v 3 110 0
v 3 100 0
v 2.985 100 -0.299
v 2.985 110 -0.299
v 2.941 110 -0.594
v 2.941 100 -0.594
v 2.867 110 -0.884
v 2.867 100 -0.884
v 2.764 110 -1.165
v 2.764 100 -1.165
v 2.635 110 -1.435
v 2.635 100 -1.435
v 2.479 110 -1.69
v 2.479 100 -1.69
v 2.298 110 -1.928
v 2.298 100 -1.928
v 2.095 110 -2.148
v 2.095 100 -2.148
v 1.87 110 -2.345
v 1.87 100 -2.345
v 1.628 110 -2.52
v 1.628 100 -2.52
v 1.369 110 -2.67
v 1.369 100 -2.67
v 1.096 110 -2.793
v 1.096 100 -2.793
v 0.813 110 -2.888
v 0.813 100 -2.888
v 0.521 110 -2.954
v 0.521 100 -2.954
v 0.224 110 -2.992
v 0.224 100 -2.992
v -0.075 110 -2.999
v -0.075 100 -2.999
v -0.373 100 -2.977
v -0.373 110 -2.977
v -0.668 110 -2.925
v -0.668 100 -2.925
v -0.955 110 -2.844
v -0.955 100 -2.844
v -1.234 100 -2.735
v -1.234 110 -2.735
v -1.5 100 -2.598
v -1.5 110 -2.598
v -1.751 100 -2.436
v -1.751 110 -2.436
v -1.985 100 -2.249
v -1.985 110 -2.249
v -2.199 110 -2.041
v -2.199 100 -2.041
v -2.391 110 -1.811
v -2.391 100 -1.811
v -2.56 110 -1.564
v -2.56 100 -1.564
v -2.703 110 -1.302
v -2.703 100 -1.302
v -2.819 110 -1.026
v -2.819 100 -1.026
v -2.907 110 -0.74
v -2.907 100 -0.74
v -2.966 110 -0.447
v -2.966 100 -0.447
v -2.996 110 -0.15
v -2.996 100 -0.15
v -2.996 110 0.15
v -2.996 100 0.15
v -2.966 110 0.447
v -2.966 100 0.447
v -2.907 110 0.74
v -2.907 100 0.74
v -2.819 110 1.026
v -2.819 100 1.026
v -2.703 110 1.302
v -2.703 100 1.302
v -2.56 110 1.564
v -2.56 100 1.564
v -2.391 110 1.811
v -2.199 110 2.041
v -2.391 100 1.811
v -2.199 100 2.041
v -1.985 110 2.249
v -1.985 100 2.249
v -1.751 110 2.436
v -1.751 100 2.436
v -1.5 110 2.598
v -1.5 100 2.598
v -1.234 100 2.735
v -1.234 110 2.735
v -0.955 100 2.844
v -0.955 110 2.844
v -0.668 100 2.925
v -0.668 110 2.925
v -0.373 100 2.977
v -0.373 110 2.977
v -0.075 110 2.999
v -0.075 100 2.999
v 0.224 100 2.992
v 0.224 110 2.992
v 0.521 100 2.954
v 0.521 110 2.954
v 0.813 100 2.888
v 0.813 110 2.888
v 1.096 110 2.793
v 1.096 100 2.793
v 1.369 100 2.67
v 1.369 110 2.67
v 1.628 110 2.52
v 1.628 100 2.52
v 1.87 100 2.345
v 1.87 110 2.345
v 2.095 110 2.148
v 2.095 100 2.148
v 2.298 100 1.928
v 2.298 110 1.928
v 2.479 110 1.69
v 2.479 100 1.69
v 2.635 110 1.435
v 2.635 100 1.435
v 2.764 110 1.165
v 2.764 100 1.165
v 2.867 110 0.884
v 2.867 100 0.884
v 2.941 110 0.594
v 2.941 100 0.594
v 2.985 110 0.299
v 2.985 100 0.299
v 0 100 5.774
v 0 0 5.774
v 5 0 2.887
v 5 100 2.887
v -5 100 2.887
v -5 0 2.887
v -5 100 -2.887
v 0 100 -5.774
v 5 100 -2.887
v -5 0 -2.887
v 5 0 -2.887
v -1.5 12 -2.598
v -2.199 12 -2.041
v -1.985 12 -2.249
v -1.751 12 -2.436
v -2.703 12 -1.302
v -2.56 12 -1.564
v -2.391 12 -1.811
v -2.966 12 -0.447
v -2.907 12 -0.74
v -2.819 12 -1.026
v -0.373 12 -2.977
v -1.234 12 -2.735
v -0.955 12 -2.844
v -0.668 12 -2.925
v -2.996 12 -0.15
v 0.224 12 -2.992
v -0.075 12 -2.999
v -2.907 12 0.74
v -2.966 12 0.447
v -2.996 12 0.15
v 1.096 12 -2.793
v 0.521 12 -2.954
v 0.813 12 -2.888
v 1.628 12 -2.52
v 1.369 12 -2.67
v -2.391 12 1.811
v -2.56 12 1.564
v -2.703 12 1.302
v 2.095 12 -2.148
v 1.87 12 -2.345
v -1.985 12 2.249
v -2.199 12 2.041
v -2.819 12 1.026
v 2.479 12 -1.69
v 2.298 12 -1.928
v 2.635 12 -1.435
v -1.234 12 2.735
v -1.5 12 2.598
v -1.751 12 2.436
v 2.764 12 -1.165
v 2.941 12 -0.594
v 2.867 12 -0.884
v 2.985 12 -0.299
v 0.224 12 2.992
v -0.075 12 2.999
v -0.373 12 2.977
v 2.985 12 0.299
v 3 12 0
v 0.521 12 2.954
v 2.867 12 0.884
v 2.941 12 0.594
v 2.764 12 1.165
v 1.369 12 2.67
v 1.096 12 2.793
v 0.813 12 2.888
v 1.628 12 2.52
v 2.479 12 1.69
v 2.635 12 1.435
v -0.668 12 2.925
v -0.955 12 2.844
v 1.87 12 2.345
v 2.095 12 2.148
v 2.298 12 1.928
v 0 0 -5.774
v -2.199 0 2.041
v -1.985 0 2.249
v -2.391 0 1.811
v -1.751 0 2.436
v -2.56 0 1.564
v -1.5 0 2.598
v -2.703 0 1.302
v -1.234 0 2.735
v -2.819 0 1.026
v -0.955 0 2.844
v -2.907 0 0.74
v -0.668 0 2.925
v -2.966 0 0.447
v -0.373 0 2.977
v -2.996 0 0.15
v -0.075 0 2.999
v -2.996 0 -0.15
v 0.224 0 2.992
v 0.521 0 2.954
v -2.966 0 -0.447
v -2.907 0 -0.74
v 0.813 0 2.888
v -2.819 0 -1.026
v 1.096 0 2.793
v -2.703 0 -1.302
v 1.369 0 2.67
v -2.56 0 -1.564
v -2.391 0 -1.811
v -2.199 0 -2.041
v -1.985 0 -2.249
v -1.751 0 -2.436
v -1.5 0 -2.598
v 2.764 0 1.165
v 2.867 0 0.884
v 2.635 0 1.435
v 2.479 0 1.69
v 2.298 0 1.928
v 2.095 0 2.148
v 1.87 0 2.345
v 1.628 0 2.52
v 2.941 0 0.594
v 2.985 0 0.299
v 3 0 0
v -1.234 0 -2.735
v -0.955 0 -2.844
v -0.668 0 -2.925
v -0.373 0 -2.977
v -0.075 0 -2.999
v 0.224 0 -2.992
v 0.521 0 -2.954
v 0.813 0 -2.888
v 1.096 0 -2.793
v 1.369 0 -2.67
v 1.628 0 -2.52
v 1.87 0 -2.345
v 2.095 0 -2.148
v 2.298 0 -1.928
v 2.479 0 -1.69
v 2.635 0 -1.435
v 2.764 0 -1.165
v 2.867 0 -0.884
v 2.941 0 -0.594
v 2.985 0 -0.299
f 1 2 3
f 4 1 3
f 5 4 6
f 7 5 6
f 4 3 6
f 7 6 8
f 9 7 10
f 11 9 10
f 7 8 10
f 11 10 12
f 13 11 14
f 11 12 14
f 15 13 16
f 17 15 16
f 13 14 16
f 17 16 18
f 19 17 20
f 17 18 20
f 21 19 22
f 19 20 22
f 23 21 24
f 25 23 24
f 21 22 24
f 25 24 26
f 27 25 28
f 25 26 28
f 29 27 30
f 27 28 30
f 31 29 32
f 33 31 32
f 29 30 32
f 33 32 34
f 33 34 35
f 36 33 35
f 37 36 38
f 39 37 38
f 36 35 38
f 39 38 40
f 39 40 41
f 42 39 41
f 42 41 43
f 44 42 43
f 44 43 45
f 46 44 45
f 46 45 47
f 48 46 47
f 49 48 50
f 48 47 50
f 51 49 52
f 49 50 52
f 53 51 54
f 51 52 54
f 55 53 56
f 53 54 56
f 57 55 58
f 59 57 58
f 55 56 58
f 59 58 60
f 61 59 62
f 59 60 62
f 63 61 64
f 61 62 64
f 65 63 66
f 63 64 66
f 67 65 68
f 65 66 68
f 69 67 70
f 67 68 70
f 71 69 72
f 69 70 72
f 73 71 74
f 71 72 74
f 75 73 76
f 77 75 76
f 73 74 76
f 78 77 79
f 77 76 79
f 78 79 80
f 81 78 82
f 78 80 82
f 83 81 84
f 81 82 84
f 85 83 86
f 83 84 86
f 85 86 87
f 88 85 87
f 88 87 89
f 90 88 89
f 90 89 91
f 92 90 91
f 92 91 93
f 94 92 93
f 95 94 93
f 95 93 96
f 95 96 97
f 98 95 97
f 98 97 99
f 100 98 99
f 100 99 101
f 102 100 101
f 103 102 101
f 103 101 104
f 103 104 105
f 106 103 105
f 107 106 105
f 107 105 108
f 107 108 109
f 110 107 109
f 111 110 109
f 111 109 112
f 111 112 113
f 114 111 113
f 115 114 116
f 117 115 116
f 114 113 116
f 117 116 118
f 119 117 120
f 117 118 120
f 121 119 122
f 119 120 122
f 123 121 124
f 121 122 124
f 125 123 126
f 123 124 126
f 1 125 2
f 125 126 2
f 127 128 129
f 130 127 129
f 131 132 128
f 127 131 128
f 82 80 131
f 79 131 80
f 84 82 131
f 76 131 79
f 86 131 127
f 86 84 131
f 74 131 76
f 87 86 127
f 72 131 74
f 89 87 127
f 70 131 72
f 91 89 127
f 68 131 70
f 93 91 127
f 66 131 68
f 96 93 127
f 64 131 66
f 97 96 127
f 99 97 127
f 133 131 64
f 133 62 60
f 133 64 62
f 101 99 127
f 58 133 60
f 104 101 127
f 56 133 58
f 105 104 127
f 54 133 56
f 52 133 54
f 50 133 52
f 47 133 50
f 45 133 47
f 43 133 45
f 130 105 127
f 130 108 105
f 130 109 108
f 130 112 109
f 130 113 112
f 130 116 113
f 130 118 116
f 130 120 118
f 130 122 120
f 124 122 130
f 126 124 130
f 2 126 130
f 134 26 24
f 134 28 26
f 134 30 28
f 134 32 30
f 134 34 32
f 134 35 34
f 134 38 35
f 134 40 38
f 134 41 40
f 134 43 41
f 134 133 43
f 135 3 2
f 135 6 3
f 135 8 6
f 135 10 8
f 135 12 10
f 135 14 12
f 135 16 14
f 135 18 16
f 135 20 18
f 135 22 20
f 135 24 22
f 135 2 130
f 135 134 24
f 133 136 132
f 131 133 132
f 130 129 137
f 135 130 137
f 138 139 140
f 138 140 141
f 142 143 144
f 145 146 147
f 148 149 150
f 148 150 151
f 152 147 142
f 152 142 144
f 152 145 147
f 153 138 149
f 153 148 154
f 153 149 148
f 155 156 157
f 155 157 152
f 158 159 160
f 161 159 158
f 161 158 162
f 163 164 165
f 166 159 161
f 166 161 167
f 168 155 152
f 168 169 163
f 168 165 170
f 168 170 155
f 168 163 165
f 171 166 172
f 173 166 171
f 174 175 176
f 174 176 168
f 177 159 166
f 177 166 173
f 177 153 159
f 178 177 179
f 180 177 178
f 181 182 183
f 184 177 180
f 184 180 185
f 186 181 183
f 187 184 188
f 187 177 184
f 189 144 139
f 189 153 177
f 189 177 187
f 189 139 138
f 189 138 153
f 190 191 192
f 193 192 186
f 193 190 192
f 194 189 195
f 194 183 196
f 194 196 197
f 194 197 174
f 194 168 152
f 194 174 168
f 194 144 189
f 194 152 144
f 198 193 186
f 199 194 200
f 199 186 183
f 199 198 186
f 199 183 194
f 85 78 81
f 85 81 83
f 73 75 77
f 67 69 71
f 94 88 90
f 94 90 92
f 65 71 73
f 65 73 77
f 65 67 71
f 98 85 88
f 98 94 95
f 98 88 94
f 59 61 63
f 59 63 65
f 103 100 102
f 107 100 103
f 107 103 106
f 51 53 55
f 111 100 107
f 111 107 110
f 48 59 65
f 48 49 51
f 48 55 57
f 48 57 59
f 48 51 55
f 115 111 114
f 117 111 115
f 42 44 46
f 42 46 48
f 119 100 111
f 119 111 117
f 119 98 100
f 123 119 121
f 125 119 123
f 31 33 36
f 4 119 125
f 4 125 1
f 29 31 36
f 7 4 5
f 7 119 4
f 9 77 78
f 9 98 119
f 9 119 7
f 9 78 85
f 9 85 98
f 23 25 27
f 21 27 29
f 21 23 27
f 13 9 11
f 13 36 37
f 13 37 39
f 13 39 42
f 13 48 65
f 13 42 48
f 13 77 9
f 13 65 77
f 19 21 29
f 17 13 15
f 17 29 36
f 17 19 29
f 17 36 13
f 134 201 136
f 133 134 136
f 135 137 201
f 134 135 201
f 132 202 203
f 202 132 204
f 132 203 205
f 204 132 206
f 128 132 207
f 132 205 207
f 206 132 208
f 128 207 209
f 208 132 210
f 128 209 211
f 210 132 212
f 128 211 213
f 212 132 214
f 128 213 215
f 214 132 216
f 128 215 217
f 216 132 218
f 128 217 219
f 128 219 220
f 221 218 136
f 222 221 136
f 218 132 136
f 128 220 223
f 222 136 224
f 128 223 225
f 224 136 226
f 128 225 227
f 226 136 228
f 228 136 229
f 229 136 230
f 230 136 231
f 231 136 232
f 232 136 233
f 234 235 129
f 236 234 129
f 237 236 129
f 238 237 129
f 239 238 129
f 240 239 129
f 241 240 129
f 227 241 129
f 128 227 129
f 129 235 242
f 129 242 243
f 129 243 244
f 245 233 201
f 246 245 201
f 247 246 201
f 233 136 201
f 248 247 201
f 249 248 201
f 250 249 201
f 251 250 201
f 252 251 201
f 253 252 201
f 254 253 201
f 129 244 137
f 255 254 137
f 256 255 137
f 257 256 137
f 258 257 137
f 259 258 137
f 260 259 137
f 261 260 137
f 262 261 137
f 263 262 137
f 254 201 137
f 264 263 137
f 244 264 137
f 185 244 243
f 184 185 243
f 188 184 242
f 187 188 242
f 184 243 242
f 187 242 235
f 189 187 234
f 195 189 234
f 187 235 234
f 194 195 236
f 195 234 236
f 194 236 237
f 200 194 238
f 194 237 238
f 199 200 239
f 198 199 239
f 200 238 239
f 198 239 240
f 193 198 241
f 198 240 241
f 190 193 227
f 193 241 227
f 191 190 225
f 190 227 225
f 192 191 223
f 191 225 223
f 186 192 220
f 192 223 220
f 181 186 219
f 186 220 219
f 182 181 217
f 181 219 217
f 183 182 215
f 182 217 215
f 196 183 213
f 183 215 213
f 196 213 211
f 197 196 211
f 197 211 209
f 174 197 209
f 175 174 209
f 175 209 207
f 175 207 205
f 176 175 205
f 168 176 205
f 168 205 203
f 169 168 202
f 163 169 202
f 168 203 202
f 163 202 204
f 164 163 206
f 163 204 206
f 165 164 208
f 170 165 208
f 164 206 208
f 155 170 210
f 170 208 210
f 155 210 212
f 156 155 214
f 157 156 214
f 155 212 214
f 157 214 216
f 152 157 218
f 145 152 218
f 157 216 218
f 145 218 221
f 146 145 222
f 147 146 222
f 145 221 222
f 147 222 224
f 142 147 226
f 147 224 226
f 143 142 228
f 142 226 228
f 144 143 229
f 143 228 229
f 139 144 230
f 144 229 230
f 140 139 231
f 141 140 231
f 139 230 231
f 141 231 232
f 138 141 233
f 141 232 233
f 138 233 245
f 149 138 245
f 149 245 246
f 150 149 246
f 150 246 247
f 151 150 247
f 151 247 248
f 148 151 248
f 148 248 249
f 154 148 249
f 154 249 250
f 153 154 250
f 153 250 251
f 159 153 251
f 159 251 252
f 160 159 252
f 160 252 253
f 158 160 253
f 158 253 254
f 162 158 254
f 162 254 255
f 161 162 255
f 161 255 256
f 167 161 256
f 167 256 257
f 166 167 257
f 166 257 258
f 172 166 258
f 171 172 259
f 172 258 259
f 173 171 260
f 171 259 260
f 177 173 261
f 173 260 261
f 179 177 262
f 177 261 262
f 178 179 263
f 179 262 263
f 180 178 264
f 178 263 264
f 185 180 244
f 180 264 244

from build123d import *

# Parameters (mm, degrees)
BOSS_EXTRUDE1_DEPTH = 100
SKETCH2_R           = 3
BOSS_EXTRUDE2_DEPTH = 10
SKETCH3_R           = 3
CUT_EXTRUDE1_DEPTH  = 12


with BuildPart() as part:
    # Sketch1 → Boss-Extrude1 (new body)
    with BuildSketch(Plane(origin=(0, 0, 0), x_dir=(1, 0, 0), z_dir=(0, 1, 0))):
        Polygon((0, -5.773502692), (5, -2.886751346), (5, 2.886751346), (0, 5.773502692), (-5, 2.886751346), (-5, -2.886751346), align=None)
    extrude(amount=BOSS_EXTRUDE1_DEPTH)

    # Sketch2 → Boss-Extrude2 (add)
    with BuildSketch(Plane(origin=(0, 100, 0), x_dir=(1, 0, 0), z_dir=(0, 1, 0))):
        Circle(SKETCH2_R)
    extrude(amount=BOSS_EXTRUDE2_DEPTH)

    # Sketch3 → Cut-Extrude1 (cut)
    with BuildSketch(Plane.XZ):
        Circle(SKETCH3_R)
    extrude(amount=-CUT_EXTRUDE1_DEPTH, mode=Mode.SUBTRACT)


solid = part.part
